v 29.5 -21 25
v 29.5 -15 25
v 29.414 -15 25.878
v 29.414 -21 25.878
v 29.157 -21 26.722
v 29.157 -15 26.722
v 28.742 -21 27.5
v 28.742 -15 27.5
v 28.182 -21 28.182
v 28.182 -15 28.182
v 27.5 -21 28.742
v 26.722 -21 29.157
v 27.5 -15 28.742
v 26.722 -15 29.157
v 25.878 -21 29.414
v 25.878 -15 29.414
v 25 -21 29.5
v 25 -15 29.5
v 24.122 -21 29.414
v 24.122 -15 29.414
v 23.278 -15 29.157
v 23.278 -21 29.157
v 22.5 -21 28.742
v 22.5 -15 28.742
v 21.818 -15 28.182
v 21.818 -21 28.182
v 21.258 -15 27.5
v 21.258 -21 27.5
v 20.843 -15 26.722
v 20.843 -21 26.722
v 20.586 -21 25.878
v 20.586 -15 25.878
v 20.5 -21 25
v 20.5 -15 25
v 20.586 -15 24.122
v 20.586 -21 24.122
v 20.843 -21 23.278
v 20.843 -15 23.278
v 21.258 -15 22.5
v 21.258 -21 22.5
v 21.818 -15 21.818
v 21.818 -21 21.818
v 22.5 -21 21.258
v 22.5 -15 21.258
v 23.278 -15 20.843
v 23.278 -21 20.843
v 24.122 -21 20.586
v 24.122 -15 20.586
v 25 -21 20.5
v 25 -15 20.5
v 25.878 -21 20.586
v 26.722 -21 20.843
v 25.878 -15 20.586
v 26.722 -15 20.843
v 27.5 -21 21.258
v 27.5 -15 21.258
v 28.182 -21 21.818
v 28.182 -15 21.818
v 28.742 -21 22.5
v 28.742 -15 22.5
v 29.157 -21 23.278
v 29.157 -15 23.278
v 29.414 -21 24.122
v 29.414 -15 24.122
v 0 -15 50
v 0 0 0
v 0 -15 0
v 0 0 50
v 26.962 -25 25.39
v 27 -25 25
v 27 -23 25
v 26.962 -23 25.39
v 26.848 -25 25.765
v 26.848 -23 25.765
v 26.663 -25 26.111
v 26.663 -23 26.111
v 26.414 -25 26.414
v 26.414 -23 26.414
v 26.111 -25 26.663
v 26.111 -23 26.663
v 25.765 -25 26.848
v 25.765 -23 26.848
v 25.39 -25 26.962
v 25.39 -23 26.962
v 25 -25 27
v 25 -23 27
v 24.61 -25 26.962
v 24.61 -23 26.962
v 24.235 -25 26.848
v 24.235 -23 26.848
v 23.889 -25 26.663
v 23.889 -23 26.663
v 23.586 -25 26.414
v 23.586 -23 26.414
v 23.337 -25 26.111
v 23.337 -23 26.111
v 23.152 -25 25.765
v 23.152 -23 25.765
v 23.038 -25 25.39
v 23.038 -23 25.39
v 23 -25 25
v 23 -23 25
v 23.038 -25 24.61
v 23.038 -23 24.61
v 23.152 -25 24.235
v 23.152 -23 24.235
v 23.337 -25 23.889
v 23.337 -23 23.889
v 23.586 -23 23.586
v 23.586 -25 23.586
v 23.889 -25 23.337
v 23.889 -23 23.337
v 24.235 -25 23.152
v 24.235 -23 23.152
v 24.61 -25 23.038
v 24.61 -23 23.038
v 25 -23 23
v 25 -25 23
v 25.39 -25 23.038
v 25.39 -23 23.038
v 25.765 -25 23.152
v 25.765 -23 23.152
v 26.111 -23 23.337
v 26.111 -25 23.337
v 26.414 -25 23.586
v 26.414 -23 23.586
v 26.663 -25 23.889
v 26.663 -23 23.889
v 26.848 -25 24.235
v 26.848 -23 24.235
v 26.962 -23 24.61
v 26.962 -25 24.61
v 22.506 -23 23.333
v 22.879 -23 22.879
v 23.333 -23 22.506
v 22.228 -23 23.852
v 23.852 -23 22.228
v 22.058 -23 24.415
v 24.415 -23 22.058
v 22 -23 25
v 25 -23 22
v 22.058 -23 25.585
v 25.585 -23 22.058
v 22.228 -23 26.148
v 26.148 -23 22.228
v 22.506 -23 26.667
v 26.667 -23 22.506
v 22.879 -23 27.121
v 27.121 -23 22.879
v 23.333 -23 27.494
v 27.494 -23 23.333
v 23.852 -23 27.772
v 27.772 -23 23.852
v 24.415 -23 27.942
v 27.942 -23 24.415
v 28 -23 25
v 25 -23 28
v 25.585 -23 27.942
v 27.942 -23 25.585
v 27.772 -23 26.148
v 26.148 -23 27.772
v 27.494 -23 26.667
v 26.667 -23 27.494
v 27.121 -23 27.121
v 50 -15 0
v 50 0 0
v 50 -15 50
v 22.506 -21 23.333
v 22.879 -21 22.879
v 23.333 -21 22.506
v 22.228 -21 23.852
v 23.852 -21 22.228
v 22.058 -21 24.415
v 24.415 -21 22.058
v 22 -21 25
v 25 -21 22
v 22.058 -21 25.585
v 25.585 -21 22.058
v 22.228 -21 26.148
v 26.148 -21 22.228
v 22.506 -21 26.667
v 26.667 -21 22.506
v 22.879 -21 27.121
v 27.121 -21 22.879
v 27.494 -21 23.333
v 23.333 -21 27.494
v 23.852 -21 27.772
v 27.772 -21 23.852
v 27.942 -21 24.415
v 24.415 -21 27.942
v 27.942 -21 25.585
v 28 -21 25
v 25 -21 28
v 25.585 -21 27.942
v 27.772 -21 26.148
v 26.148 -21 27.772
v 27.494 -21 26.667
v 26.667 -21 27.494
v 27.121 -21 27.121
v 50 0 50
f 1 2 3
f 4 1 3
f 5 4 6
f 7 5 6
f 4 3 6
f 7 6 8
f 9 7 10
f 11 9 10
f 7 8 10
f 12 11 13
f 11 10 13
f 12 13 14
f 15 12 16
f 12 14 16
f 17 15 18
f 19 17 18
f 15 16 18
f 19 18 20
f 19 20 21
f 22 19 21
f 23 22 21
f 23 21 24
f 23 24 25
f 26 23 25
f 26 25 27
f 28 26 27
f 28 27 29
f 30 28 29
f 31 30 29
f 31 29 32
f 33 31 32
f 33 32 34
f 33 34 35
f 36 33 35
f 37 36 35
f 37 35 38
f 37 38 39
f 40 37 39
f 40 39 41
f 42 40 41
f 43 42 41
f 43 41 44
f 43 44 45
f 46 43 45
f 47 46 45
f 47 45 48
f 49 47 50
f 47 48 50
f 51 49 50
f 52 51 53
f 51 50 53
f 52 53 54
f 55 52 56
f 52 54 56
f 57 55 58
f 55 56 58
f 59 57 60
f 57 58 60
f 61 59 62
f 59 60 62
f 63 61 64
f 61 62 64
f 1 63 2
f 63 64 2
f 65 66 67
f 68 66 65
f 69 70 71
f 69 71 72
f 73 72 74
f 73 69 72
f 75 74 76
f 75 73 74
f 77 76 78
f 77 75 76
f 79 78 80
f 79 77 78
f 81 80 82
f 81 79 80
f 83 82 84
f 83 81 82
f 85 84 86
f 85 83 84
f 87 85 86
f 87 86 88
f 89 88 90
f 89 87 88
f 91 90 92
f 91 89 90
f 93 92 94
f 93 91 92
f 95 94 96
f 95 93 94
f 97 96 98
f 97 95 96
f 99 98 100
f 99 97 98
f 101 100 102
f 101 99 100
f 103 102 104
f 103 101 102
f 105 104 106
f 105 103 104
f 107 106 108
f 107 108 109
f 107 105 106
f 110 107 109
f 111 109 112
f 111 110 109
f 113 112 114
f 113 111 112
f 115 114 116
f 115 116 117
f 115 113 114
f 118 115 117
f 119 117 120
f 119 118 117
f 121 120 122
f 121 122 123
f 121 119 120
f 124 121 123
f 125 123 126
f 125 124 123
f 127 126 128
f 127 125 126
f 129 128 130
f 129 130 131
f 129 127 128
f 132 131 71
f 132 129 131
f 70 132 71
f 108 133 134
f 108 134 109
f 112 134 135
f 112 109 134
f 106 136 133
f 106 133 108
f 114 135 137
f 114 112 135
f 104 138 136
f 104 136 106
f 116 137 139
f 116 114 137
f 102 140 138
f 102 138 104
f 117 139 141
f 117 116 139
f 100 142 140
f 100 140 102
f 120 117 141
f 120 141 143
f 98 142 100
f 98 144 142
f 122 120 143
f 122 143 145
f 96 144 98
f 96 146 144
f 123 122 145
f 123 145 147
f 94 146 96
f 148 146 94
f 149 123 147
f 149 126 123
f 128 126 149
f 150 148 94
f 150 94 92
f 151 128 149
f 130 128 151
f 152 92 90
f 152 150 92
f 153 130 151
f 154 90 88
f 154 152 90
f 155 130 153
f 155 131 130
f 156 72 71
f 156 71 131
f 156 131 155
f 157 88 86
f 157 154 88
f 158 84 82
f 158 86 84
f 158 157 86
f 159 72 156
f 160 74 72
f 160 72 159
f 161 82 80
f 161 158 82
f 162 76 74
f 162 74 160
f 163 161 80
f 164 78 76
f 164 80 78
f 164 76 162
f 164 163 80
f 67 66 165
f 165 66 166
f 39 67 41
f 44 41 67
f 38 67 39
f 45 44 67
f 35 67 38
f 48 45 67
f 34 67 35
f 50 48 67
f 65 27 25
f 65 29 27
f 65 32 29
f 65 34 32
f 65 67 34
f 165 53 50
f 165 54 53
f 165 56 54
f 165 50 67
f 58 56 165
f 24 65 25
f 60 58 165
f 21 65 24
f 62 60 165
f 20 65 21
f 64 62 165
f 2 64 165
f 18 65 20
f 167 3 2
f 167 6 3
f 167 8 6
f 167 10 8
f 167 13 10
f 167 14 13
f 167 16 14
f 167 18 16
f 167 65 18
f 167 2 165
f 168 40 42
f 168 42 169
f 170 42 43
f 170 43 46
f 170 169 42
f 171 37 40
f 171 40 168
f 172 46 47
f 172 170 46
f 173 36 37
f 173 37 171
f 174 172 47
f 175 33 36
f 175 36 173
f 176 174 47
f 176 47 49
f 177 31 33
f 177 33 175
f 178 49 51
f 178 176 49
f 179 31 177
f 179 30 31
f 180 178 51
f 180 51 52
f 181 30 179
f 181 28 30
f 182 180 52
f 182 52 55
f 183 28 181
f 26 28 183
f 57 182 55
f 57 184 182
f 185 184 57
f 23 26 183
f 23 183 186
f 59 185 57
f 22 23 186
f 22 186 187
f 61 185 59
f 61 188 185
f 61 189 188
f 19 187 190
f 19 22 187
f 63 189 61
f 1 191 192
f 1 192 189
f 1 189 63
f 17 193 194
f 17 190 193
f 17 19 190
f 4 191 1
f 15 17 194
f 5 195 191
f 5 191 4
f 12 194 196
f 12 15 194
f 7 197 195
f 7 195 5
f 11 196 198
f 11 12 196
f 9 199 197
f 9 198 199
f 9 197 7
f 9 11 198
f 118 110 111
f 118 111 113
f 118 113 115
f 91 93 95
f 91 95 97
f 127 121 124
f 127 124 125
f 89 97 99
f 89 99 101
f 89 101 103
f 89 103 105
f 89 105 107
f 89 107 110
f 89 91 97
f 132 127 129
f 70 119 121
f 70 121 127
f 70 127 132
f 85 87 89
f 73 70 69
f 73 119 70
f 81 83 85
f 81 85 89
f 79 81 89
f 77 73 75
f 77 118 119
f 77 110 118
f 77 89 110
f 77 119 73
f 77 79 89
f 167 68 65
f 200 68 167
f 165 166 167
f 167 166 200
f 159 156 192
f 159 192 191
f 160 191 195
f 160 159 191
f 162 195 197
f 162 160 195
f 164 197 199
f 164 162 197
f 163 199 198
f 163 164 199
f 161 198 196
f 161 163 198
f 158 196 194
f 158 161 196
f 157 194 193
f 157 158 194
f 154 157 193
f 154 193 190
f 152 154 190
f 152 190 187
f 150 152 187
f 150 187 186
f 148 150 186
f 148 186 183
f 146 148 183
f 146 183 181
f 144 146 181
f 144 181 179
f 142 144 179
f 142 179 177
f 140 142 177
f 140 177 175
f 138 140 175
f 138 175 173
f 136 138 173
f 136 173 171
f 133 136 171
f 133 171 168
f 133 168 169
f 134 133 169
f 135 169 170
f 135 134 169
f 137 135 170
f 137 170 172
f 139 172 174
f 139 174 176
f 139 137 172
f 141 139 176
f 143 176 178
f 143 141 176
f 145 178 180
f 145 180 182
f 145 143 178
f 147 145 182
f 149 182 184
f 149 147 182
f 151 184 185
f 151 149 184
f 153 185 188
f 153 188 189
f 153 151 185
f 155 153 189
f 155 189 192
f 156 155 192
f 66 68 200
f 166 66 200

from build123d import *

# Parameters (mm, degrees)
F0_W     = 50
F0_H     = 50
F1_DEPTH = 15
F2_R     = 4.5
F3_DEPTH = 10
F4_R     = 4.5
F4_R_2   = 3
F5_DEPTH = 4
F6_R     = 3
F6_R_2   = 2
F7_DEPTH = 2


with BuildPart() as f1:
    # F0 (on Front) → F1 (new body)
    with BuildSketch(Plane.XZ):
        with Locations((25, 25)):
            Rectangle(F0_W, F0_H)
    extrude(amount=F1_DEPTH)

    # F2 (on face) → F3 (join)
    with BuildSketch(Plane.XZ.offset(15)):
        with Locations((25, 25)):
            Circle(F2_R)
    extrude(amount=F3_DEPTH)

    # F4 (on face) → F5 (cut)
    with BuildSketch(Plane.XZ.offset(25)):
        with Locations((25, 25)):
            Circle(F4_R)
        with Locations((25, 25)):
            Circle(F4_R_2, mode=Mode.SUBTRACT)
    extrude(amount=-F5_DEPTH, mode=Mode.SUBTRACT)

    # F6 (on face) → F7 (cut)
    with BuildSketch(Plane.XZ.offset(25)):
        with Locations((25, 25)):
            Circle(F6_R)
        with Locations((25, 25)):
            Circle(F6_R_2, mode=Mode.SUBTRACT)
    extrude(amount=-F7_DEPTH, mode=Mode.SUBTRACT)


solid = f1.part
